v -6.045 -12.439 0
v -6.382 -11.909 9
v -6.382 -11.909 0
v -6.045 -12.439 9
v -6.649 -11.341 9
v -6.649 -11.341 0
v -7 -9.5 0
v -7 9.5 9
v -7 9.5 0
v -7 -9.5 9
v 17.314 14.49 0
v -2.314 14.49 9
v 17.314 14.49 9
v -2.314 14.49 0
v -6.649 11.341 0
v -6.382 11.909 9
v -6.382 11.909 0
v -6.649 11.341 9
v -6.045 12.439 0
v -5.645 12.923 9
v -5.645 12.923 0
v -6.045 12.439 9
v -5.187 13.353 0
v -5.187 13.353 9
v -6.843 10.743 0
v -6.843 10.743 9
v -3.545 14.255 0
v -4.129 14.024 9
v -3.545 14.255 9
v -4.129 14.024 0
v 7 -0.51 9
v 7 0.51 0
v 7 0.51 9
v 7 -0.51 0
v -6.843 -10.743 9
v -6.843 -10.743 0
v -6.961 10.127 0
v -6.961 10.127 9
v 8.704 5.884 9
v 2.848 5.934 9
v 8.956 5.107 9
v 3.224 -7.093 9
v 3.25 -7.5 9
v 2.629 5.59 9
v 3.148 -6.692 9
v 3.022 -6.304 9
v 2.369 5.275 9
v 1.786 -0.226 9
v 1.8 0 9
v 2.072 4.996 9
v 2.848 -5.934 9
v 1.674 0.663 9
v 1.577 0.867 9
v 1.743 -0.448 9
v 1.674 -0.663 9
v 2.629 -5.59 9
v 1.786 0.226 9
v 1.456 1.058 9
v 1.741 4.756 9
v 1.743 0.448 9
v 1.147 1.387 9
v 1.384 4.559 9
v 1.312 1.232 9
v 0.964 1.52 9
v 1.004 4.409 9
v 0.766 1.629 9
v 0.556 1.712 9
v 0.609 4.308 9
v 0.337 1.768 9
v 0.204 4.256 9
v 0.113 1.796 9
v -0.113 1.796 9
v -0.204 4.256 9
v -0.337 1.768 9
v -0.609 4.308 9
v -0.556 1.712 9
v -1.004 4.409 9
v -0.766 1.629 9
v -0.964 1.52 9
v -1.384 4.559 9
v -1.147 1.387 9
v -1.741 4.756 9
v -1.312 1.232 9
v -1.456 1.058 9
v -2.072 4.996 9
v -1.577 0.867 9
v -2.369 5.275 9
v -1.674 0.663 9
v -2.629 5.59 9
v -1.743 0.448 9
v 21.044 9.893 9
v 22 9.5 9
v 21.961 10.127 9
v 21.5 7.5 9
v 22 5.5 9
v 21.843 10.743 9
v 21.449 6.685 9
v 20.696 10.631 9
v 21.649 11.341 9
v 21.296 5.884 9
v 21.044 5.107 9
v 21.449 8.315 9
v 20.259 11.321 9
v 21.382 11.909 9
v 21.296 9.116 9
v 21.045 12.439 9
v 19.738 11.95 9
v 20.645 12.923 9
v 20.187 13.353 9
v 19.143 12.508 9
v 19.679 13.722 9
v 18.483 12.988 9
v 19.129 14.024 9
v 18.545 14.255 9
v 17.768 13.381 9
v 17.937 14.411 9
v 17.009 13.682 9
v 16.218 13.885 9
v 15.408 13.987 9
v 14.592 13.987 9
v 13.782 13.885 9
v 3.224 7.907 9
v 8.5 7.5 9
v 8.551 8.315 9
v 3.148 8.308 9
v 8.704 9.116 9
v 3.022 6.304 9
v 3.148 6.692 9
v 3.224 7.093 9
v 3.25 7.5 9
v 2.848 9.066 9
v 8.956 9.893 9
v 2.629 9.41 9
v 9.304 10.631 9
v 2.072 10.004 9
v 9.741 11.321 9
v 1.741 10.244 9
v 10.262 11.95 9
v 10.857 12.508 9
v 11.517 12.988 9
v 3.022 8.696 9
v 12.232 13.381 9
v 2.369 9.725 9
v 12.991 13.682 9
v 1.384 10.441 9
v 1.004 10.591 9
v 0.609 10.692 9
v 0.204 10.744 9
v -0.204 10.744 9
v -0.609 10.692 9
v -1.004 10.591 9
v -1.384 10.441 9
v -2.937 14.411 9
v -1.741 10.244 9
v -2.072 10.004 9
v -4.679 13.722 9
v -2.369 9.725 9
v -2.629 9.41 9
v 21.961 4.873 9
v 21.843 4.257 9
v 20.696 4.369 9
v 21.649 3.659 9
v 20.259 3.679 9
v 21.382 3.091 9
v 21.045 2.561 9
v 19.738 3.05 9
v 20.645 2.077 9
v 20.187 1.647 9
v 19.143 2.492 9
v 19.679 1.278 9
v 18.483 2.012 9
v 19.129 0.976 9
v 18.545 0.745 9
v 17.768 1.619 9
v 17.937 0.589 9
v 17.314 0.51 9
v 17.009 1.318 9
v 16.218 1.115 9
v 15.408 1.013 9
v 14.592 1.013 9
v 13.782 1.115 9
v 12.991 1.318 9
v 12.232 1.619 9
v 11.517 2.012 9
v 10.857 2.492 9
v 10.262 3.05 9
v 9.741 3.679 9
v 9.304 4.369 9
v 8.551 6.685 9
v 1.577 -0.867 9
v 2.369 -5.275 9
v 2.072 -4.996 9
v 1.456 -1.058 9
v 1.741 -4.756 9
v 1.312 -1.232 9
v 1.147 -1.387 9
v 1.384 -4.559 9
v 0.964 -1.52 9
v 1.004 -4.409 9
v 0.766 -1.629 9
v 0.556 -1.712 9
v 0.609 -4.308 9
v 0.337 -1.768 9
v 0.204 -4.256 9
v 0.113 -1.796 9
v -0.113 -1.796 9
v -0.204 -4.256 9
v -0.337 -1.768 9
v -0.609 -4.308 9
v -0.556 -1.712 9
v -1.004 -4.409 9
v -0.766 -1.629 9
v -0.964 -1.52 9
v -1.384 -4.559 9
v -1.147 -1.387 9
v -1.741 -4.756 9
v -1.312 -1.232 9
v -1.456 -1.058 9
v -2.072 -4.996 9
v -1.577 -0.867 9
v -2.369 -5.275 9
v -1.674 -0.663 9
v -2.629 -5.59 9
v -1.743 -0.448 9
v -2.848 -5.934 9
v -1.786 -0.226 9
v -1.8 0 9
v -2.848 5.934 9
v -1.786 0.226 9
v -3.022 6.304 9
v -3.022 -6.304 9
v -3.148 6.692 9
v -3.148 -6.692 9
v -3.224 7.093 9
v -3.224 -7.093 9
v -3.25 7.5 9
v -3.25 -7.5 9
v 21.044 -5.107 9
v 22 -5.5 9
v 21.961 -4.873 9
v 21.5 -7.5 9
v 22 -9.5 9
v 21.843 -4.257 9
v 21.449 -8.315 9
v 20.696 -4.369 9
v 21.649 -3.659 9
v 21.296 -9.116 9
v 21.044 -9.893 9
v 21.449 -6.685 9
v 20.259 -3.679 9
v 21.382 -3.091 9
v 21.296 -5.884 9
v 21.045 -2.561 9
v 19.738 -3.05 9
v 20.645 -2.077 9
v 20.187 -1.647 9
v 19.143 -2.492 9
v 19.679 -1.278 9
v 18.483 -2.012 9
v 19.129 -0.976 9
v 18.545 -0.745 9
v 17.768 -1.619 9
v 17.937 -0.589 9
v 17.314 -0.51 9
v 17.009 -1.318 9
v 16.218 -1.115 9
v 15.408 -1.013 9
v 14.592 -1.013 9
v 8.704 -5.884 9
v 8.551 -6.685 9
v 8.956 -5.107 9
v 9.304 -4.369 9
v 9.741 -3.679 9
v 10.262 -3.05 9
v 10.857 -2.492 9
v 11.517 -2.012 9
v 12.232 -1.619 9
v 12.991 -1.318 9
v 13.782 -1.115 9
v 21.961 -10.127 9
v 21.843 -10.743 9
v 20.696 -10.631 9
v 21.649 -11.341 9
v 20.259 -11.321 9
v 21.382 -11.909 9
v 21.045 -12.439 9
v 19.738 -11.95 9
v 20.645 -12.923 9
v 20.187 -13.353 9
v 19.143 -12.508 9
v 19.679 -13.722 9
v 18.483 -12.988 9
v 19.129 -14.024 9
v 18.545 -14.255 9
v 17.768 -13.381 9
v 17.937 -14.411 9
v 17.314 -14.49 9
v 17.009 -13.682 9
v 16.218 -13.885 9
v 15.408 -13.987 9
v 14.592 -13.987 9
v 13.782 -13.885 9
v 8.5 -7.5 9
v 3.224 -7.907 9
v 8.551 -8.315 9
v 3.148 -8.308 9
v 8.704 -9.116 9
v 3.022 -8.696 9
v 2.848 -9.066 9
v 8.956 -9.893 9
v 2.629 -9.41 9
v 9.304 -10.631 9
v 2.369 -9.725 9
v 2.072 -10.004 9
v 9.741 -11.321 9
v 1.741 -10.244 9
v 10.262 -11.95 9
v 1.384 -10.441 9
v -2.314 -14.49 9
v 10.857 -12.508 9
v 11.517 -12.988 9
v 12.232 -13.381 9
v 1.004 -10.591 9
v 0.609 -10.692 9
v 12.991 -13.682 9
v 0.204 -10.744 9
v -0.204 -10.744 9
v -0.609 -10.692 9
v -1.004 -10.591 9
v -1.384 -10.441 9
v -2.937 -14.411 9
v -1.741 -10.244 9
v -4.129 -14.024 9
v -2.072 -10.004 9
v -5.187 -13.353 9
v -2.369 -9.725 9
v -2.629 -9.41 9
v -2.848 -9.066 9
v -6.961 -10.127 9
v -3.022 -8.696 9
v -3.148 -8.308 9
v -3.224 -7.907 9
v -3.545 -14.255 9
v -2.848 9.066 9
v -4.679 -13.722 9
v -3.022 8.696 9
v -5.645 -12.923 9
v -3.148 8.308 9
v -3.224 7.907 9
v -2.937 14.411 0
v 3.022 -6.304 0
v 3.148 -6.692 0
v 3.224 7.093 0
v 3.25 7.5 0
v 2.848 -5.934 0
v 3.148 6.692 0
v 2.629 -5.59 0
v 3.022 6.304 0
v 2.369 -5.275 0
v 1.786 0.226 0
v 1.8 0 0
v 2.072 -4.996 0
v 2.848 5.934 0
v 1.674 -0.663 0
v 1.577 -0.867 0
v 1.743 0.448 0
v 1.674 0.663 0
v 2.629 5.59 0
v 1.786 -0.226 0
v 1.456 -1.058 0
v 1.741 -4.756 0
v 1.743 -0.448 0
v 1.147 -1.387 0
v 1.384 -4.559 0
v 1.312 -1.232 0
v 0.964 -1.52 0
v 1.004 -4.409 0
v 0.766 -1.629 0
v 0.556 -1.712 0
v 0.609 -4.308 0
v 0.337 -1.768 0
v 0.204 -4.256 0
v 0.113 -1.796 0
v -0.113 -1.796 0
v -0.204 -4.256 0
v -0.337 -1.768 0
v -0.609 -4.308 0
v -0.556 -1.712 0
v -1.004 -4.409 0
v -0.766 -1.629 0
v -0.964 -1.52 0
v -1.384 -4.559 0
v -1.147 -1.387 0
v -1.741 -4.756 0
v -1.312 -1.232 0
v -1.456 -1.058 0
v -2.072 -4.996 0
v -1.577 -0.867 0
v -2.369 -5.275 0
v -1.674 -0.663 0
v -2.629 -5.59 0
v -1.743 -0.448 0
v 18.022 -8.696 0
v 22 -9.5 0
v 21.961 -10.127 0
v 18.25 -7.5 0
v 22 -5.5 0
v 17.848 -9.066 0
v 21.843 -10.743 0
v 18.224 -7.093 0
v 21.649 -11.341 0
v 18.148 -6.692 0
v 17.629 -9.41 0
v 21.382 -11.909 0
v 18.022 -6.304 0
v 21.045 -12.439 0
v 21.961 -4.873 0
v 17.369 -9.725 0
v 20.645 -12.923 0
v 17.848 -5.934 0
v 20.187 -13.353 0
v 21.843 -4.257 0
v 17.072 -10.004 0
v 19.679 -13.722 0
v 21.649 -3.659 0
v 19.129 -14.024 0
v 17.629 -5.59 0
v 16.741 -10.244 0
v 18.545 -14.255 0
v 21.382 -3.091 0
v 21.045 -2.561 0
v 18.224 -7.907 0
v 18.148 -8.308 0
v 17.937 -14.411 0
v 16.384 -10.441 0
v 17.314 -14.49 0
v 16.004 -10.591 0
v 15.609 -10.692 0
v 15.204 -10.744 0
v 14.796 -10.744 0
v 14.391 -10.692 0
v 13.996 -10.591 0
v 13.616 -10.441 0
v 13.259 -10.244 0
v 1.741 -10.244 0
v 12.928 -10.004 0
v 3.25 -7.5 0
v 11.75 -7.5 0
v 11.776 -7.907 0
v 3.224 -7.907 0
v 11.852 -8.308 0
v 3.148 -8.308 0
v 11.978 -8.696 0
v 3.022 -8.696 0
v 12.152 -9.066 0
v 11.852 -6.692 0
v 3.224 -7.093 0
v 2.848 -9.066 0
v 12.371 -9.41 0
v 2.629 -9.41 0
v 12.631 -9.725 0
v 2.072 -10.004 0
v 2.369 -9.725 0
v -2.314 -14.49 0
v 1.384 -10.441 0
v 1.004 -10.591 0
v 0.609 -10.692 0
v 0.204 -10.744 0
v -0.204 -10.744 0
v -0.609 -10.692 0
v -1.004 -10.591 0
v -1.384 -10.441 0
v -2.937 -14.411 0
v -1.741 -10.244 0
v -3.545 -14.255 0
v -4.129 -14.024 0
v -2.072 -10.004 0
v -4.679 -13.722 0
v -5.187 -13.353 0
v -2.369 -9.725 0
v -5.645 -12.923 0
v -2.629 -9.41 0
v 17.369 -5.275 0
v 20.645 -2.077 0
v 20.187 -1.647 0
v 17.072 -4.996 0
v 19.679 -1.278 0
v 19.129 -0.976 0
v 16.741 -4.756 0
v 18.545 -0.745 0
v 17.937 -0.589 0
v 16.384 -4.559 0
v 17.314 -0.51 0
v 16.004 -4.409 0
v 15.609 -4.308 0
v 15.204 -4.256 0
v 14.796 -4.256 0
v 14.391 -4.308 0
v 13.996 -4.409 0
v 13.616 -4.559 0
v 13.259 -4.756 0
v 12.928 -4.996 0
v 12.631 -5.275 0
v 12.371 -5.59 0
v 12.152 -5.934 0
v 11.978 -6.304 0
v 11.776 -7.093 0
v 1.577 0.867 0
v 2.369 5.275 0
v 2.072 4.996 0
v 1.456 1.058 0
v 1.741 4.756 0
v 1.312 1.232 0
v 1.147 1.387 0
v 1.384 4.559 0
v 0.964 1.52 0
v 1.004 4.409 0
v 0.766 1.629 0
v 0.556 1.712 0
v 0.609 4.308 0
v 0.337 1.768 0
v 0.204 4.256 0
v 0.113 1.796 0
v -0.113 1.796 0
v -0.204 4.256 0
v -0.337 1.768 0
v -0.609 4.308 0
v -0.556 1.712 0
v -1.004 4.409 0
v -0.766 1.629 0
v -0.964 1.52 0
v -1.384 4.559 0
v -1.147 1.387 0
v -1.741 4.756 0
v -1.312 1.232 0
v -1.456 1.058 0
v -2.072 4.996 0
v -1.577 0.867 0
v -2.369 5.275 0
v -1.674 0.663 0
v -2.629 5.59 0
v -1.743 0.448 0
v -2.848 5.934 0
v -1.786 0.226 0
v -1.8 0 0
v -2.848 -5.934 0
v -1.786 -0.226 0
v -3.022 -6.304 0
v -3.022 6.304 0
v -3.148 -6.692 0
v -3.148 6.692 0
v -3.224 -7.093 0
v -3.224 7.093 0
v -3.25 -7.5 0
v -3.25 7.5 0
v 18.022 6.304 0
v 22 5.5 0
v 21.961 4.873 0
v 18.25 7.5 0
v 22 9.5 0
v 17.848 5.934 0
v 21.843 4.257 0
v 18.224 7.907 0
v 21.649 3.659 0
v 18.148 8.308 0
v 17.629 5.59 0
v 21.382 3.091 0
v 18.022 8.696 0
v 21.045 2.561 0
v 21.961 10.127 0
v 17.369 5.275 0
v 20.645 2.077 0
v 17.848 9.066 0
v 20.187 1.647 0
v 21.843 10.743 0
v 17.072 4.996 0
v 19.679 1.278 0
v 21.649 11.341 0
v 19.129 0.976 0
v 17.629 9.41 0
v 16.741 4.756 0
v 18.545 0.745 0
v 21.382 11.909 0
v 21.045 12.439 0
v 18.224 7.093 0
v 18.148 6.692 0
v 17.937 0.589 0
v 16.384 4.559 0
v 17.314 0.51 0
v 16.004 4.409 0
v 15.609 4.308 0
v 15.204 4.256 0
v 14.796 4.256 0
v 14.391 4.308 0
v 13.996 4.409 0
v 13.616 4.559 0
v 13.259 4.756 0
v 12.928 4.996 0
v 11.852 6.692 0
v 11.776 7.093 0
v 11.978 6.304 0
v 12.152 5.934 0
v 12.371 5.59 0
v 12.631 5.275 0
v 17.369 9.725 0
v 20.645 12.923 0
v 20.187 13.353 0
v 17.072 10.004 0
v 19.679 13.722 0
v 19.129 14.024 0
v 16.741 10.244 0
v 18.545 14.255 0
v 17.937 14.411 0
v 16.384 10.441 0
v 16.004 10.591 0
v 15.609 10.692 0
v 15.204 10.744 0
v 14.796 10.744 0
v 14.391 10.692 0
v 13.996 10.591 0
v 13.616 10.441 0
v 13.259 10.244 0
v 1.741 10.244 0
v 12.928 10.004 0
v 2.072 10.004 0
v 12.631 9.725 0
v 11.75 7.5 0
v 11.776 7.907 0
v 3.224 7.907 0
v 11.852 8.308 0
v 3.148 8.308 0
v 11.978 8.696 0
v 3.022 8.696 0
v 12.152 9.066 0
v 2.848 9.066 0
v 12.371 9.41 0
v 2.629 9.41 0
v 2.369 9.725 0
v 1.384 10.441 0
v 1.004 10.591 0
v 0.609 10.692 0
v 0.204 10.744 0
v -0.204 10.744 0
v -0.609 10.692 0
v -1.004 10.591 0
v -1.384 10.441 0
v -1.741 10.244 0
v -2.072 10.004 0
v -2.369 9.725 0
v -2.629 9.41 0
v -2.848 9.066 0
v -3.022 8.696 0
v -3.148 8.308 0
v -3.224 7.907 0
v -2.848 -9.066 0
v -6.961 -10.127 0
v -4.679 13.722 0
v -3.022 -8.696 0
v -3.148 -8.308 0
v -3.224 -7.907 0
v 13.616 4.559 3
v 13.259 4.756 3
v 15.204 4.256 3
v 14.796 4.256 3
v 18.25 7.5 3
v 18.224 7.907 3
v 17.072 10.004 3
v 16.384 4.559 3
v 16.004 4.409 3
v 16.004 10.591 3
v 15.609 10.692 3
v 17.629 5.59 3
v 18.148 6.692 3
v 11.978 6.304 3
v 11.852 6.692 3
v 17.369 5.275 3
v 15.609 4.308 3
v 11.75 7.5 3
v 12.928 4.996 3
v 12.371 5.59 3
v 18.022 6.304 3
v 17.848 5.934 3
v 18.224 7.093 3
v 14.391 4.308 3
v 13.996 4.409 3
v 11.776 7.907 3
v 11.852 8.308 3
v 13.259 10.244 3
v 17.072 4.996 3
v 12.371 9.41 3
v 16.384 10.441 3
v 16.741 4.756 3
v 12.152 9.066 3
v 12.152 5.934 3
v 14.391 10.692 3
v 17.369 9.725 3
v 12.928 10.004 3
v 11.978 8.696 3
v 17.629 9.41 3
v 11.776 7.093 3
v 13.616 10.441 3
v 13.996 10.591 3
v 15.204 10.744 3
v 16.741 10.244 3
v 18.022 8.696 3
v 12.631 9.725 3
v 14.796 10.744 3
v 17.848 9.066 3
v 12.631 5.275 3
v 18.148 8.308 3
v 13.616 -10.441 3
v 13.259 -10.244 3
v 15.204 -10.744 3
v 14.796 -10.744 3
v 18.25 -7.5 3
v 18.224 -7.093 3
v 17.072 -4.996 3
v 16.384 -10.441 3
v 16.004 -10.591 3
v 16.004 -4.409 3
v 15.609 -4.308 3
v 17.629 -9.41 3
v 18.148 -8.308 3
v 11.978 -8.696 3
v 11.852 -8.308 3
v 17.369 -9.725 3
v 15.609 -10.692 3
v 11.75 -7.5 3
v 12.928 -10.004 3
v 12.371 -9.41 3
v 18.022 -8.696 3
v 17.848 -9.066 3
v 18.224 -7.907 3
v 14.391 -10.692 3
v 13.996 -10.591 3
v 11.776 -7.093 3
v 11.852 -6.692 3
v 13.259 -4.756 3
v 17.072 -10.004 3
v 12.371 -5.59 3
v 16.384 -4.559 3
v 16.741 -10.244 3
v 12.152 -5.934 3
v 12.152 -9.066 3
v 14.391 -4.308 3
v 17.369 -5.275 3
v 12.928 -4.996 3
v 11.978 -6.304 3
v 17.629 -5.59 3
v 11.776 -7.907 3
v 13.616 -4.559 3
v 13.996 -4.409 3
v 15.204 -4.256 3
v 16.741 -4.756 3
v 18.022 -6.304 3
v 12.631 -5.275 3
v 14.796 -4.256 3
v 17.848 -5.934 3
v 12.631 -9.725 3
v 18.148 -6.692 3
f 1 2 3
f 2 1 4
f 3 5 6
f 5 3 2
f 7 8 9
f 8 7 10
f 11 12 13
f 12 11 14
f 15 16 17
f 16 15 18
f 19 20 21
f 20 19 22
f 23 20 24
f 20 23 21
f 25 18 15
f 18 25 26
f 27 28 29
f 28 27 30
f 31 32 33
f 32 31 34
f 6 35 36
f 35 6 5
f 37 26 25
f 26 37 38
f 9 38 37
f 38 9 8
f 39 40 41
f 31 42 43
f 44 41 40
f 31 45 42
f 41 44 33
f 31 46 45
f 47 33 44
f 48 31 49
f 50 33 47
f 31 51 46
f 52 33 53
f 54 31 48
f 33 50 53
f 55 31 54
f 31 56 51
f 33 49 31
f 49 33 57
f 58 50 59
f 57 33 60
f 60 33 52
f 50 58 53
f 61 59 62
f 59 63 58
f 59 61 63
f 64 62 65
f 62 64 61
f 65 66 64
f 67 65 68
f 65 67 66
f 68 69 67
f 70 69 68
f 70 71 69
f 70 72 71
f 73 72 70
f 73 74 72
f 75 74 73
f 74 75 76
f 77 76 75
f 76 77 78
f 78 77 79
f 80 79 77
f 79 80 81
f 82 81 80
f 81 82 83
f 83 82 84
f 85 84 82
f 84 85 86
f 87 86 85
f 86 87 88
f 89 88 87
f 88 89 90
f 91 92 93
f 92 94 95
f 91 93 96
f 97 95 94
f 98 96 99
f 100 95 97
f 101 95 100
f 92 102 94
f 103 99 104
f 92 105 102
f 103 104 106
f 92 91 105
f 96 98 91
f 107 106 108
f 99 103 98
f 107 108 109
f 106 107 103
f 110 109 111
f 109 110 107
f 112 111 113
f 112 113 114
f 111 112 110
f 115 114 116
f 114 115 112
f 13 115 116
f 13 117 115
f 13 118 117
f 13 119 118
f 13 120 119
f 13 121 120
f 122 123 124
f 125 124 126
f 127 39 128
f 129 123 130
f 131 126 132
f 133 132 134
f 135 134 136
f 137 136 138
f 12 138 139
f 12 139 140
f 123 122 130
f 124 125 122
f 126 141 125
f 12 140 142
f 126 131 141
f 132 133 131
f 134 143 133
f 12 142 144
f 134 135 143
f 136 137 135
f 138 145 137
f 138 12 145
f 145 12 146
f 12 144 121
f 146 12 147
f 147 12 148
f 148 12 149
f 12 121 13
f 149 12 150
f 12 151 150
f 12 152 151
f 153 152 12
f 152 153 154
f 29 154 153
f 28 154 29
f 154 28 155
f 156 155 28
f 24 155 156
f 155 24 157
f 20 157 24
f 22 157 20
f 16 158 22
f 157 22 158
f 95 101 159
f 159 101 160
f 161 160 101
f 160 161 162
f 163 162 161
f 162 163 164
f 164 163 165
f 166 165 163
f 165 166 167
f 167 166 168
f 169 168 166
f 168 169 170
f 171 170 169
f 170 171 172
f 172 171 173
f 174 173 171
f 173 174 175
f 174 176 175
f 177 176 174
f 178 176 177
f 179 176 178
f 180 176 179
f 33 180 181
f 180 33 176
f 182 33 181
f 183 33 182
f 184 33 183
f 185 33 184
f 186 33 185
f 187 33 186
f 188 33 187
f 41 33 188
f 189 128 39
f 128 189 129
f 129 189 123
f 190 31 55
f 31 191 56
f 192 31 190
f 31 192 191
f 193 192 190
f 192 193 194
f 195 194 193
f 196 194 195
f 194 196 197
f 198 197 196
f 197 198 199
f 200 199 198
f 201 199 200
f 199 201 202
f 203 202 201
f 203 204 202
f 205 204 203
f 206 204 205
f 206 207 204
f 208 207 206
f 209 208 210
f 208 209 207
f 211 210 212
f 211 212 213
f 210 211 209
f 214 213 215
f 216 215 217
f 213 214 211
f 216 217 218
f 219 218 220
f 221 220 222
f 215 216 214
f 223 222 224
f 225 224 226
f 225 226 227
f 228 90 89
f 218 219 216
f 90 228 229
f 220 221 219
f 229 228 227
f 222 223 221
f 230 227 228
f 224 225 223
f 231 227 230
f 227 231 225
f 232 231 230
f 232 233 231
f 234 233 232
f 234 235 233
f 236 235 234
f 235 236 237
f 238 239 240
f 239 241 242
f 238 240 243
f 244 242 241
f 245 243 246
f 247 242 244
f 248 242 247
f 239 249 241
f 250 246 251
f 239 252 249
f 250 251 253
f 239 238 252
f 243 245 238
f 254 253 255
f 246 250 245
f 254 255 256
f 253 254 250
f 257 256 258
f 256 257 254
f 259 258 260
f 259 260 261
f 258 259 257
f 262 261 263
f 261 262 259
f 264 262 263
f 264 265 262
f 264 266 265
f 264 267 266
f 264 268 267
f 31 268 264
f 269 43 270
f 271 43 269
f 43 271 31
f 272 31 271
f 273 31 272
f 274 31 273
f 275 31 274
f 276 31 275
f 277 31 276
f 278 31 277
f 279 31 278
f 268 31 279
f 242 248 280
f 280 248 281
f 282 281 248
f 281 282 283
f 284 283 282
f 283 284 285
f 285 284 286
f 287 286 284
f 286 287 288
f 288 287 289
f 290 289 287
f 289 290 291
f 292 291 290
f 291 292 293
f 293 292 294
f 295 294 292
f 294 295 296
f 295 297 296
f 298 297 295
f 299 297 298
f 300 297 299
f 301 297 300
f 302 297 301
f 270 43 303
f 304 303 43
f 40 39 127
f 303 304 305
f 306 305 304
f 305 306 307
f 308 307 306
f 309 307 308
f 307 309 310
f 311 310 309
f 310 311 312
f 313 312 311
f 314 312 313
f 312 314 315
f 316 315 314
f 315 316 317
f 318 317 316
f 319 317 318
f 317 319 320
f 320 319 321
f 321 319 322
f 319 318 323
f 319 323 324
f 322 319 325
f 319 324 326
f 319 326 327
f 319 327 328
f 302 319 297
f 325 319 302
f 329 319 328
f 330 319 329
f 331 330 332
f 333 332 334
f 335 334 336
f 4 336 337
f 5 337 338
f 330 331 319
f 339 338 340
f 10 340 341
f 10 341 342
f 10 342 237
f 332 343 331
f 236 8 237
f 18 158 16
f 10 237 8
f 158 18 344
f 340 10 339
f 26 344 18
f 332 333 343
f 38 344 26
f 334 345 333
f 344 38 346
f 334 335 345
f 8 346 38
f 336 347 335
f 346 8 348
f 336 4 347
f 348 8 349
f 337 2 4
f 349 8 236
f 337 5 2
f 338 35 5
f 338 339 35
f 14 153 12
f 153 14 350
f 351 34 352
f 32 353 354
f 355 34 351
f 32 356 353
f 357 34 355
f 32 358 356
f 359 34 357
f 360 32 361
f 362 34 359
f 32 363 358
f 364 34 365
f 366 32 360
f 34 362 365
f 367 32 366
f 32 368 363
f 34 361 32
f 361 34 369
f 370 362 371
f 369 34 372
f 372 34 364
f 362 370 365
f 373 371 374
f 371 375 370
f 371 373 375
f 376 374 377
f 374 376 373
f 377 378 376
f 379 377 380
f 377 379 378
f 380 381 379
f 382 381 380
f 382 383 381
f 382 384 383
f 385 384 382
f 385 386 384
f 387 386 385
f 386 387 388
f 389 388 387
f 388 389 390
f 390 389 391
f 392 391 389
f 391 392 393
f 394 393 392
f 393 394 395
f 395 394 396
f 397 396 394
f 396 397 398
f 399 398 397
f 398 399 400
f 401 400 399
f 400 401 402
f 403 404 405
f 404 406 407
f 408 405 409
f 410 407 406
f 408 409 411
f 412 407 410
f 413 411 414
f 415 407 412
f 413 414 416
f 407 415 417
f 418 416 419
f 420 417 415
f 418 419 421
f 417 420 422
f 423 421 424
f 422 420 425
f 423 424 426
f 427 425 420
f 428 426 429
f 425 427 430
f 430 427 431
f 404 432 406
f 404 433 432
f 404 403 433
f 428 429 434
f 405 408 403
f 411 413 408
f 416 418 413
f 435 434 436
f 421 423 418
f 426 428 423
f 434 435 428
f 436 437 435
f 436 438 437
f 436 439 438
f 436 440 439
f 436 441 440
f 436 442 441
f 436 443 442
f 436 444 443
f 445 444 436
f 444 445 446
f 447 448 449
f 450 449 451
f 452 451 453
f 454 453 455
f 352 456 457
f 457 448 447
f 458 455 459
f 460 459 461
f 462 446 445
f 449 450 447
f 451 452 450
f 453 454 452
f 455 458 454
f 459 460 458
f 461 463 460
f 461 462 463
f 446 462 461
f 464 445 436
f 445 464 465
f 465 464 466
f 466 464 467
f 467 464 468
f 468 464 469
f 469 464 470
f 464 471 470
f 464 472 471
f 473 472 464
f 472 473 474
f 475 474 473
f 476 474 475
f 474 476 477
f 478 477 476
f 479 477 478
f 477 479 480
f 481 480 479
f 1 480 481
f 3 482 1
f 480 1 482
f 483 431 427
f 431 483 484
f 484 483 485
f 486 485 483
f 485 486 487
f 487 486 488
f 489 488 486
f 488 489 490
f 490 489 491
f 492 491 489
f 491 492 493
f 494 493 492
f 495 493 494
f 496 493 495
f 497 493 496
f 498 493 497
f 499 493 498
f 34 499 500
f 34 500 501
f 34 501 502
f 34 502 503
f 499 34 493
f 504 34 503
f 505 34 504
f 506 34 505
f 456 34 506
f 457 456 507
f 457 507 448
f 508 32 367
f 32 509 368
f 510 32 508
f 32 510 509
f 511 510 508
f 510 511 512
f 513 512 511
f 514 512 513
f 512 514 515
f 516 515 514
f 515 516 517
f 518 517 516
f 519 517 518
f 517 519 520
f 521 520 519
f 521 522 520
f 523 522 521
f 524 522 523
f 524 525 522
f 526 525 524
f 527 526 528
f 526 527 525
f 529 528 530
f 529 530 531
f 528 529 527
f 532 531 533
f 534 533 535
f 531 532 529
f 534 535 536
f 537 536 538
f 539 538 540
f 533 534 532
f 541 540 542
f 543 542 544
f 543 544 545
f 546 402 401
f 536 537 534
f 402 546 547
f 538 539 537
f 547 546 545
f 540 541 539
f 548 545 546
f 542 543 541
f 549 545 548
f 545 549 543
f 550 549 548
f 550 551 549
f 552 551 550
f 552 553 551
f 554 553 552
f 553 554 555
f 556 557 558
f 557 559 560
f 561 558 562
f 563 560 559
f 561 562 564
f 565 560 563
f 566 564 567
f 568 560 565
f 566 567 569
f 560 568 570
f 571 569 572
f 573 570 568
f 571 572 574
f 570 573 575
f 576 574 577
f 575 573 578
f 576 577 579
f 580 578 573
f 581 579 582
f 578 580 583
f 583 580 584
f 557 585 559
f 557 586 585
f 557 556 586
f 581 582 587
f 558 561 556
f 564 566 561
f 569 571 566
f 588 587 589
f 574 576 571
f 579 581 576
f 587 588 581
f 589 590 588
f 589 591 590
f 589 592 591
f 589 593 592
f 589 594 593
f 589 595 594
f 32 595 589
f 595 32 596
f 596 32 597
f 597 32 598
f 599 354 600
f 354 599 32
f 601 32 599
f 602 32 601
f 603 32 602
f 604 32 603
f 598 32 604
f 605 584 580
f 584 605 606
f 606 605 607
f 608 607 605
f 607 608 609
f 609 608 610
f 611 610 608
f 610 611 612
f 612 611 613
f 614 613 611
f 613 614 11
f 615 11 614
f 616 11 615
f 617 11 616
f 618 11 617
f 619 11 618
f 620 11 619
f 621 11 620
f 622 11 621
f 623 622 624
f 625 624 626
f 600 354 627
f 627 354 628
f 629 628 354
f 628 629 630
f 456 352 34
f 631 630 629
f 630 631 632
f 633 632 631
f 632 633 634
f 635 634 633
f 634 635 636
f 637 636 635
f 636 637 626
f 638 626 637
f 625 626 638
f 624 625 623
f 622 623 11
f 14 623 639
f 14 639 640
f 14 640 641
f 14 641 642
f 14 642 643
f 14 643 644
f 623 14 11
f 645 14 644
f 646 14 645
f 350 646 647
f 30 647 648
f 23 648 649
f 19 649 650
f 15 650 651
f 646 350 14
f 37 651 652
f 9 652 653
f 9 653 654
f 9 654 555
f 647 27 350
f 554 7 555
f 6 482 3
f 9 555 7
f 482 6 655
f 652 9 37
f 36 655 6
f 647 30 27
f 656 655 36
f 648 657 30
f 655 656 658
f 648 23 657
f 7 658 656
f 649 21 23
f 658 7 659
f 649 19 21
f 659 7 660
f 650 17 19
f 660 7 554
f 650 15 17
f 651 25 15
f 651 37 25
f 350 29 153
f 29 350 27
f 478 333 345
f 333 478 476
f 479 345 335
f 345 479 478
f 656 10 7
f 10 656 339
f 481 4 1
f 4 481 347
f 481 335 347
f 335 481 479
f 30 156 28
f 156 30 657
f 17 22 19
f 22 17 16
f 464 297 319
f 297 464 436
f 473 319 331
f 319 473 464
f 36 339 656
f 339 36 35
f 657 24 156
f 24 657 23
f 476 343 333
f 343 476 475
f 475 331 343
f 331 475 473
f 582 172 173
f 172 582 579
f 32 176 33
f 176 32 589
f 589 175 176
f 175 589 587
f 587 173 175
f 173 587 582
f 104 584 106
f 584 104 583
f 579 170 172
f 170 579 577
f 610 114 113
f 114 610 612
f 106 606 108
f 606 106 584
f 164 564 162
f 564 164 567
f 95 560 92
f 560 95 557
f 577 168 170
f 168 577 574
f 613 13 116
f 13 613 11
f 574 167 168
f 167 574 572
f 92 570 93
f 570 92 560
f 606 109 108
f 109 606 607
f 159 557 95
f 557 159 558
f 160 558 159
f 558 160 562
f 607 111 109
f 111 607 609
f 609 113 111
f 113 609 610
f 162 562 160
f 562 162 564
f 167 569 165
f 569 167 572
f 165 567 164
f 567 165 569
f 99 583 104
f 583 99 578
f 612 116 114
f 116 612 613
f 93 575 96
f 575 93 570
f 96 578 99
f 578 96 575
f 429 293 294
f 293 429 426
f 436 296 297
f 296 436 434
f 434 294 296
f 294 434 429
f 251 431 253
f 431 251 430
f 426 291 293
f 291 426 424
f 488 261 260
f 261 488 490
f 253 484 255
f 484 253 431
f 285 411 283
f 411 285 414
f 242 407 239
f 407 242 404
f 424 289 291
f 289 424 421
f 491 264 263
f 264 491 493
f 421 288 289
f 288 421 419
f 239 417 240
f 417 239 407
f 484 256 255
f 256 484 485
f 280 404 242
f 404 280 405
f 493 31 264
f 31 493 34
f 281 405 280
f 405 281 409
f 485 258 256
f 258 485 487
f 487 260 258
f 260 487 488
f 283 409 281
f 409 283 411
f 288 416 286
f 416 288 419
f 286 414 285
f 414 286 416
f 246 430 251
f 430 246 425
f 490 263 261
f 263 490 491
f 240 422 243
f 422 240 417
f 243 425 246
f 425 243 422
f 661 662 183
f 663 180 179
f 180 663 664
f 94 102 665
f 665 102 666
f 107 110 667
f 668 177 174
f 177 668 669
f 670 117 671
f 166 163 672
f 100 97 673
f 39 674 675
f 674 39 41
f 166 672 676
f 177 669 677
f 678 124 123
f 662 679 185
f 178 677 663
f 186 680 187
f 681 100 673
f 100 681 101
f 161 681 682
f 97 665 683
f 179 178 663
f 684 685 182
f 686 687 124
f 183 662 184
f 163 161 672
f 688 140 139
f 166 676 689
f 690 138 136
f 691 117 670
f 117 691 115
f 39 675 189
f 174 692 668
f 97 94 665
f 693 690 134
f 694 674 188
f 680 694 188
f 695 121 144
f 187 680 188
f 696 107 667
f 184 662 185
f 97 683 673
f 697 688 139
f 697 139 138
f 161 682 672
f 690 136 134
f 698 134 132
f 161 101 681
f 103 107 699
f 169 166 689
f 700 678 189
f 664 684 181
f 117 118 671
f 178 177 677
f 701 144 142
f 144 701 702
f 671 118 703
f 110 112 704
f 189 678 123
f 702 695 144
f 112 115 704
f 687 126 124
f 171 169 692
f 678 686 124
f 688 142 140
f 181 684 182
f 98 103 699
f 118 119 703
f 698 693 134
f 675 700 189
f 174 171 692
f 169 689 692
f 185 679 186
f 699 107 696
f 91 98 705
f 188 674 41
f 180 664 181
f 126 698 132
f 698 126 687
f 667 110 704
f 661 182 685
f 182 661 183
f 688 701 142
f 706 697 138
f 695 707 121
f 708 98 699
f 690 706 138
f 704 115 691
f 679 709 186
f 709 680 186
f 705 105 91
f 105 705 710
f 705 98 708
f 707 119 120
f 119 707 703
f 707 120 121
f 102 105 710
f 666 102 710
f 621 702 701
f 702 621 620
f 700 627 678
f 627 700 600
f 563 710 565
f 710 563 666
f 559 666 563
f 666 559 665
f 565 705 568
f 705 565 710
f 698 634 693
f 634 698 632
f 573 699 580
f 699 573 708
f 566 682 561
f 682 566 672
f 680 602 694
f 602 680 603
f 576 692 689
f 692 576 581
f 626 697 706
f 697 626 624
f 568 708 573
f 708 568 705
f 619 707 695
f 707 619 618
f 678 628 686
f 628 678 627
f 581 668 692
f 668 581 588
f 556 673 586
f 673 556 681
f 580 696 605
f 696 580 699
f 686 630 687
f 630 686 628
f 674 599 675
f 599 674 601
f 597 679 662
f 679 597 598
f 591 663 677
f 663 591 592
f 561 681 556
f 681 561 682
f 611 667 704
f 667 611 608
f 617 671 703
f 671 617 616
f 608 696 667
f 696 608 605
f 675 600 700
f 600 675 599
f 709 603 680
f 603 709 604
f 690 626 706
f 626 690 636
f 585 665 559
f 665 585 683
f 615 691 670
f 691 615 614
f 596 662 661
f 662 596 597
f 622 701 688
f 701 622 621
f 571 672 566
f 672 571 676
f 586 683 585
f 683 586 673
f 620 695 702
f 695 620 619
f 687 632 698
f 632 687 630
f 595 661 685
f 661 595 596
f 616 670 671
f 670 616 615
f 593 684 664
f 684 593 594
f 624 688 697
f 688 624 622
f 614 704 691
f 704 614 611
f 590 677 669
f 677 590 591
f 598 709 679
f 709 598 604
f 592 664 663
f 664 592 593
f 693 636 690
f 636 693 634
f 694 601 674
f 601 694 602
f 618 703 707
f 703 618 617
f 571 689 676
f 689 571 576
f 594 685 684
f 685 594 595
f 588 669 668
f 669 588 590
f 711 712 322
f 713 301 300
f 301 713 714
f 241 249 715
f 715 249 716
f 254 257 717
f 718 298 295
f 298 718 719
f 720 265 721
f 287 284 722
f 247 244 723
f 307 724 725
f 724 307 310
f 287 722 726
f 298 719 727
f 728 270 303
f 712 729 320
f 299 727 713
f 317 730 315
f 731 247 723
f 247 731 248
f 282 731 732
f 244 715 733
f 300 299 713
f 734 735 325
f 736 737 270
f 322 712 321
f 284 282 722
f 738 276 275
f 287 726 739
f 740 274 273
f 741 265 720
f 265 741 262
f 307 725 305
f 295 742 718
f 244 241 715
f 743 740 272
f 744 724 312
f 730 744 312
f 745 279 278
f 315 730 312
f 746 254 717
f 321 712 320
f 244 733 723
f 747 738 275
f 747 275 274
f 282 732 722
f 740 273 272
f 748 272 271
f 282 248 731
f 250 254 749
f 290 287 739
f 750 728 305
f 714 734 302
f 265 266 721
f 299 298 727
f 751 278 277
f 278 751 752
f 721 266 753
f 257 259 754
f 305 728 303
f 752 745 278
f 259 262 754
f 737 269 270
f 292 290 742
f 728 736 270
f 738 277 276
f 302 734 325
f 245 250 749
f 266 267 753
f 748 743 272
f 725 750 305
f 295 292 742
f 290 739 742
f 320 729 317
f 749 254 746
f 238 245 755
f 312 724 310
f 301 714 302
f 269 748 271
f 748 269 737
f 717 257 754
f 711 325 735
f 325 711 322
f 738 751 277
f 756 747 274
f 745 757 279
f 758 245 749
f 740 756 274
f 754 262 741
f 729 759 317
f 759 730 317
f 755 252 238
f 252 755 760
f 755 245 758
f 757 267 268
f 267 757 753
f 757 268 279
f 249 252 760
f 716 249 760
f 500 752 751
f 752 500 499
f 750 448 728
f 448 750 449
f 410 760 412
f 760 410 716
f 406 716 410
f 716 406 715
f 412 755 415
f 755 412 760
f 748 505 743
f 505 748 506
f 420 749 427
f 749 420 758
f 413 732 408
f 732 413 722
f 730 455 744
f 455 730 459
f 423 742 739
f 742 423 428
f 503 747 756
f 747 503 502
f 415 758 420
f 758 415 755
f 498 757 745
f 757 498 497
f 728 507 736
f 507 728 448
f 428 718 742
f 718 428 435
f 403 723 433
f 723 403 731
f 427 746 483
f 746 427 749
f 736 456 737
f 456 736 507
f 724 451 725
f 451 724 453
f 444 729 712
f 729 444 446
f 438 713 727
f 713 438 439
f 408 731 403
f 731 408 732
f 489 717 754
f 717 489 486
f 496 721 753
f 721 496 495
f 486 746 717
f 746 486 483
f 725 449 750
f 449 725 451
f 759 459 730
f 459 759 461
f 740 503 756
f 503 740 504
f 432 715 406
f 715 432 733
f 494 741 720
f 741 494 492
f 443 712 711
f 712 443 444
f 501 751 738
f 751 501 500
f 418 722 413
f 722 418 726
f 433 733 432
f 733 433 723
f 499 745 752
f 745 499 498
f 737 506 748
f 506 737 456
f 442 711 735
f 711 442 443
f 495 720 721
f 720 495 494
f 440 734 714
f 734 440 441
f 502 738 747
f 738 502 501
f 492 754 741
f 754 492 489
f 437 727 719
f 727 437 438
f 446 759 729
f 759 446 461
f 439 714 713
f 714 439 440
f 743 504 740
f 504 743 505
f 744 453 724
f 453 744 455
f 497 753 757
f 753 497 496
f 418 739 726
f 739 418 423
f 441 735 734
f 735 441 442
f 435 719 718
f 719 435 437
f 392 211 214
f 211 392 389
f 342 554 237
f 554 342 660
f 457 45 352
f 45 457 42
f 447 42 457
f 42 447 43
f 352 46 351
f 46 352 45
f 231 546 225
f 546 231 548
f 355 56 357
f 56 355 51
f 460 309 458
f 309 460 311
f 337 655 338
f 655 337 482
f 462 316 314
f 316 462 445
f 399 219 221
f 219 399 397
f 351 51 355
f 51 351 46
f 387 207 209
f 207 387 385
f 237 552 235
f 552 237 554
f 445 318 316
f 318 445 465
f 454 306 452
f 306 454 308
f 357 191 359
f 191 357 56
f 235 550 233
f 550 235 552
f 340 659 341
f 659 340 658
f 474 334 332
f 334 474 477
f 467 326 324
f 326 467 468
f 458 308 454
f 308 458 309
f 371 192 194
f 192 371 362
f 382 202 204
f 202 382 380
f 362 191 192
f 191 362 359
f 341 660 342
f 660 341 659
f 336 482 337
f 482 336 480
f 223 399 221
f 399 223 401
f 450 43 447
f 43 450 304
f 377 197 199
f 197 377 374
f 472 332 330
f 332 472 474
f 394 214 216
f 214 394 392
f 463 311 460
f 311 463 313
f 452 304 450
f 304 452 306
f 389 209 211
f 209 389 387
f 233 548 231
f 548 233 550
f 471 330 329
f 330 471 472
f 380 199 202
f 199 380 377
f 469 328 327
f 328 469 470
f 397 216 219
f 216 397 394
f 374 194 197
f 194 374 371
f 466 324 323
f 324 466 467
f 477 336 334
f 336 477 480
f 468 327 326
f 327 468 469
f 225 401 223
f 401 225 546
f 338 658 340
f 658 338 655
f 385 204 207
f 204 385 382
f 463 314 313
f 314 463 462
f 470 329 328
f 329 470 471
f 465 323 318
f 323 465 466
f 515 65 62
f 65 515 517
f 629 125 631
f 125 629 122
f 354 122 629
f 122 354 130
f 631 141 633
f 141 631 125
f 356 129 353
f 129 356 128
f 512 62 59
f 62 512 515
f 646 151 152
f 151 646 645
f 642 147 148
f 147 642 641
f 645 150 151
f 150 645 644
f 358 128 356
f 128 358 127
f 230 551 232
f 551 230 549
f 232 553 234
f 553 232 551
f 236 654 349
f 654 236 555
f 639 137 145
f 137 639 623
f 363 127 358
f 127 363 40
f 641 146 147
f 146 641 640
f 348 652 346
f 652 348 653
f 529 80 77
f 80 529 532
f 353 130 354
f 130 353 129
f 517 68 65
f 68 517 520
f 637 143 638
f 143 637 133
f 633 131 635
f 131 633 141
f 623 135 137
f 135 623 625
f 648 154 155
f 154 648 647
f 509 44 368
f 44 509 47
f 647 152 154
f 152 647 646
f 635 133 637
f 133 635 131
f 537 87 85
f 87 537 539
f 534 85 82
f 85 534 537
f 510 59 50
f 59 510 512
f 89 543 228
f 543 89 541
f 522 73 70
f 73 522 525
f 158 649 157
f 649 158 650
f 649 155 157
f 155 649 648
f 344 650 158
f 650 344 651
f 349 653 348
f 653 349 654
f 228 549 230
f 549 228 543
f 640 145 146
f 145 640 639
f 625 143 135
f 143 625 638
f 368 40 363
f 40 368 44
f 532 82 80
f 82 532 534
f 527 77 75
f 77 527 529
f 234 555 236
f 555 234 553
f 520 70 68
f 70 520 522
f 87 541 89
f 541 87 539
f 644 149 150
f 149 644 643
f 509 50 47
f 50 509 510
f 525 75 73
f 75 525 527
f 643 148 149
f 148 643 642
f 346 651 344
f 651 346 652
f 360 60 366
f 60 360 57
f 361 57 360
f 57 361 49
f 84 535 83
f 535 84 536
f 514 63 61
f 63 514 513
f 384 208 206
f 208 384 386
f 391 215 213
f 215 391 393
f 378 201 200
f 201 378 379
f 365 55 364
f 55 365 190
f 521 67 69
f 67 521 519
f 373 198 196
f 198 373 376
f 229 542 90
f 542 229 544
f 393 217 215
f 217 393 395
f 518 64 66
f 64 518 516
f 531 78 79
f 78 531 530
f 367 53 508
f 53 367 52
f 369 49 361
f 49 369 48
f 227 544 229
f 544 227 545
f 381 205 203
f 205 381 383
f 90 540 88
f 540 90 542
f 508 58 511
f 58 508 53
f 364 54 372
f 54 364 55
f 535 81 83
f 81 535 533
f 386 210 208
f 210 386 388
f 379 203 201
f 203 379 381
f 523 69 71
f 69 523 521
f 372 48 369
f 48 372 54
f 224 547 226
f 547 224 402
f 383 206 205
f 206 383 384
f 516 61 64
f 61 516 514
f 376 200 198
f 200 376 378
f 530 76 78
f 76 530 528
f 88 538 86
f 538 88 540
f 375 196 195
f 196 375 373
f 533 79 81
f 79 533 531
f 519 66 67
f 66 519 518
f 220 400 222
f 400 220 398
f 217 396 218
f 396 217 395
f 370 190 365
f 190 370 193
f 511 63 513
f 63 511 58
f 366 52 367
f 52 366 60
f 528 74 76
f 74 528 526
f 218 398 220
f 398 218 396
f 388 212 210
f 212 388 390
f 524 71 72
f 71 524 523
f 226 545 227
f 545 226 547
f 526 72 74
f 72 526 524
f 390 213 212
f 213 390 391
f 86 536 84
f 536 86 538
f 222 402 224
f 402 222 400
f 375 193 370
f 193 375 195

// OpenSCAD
$fn = 50;


difference() {
	union() {
		hull() {
			translate(v = [-2.0000000000, 9.5000000000, 0]) {
				cylinder(h = 9, r = 5);
			}
			translate(v = [2.0000000000, 9.5000000000, 0]) {
				cylinder(h = 9, r = 5);
			}
			translate(v = [-2.0000000000, -9.5000000000, 0]) {
				cylinder(h = 9, r = 5);
			}
			translate(v = [2.0000000000, -9.5000000000, 0]) {
				cylinder(h = 9, r = 5);
			}
		}
		translate(v = [7.5000000000, 7.5000000000, 0]) {
			hull() {
				translate(v = [-9.5000000000, 2.0000000000, 0]) {
					cylinder(h = 9, r = 5);
				}
				translate(v = [9.5000000000, 2.0000000000, 0]) {
					cylinder(h = 9, r = 5);
				}
				translate(v = [-9.5000000000, -2.0000000000, 0]) {
					cylinder(h = 9, r = 5);
				}
				translate(v = [9.5000000000, -2.0000000000, 0]) {
					cylinder(h = 9, r = 5);
				}
			}
		}
		translate(v = [7.5000000000, -7.5000000000, 0]) {
			hull() {
				translate(v = [-9.5000000000, 2.0000000000, 0]) {
					cylinder(h = 9, r = 5);
				}
				translate(v = [9.5000000000, 2.0000000000, 0]) {
					cylinder(h = 9, r = 5);
				}
				translate(v = [-9.5000000000, -2.0000000000, 0]) {
					cylinder(h = 9, r = 5);
				}
				translate(v = [9.5000000000, -2.0000000000, 0]) {
					cylinder(h = 9, r = 5);
				}
			}
		}
	}
	union() {
		translate(v = [15.0000000000, 7.5000000000, 9]) {
			rotate(a = [0, 0, 0]) {
				difference() {
					union() {
						#translate(v = [0, 0, -9.0000000000]) {
							cylinder(h = 9, r = 2.2500000000);
						}
						#translate(v = [0, 0, -6]) {
							cylinder(h = 6, r1 = 3.2500000000, r2 = 6.5000000000);
						}
						#translate(v = [0, 0, -9.0000000000]) {
							cylinder(h = 9, r = 3.2500000000);
						}
						#translate(v = [0, 0, -9.0000000000]) {
							cylinder(h = 9, r = 2.2500000000);
						}
					}
					union();
				}
			}
		}
		translate(v = [15.0000000000, -7.5000000000, 9]) {
			rotate(a = [0, 0, 0]) {
				difference() {
					union() {
						#translate(v = [0, 0, -9.0000000000]) {
							cylinder(h = 9, r = 2.2500000000);
						}
						#translate(v = [0, 0, -6]) {
							cylinder(h = 6, r1 = 3.2500000000, r2 = 6.5000000000);
						}
						#translate(v = [0, 0, -9.0000000000]) {
							cylinder(h = 9, r = 3.2500000000);
						}
						#translate(v = [0, 0, -9.0000000000]) {
							cylinder(h = 9, r = 2.2500000000);
						}
					}
					union();
				}
			}
		}
		translate(v = [0.0000000000, -7.5000000000, 0]) {
			translate(v = [0, 0, -100]) {
				cylinder(h = 200, r = 3.2500000000);
			}
		}
		translate(v = [0.0000000000, 7.5000000000, 0]) {
			translate(v = [0, 0, -100]) {
				cylinder(h = 200, r = 3.2500000000);
			}
		}
		translate(v = [0.0000000000, -7.5000000000, 0]) {
			translate(v = [0, 0, -100]) {
				cylinder(h = 200, r = 1.8000000000);
			}
		}
		translate(v = [0, 0, -100]) {
			cylinder(h = 200, r = 1.8000000000);
		}
		translate(v = [0.0000000000, 7.5000000000, 0]) {
			translate(v = [0, 0, -100]) {
				cylinder(h = 200, r = 1.8000000000);
			}
		}
	}
}
